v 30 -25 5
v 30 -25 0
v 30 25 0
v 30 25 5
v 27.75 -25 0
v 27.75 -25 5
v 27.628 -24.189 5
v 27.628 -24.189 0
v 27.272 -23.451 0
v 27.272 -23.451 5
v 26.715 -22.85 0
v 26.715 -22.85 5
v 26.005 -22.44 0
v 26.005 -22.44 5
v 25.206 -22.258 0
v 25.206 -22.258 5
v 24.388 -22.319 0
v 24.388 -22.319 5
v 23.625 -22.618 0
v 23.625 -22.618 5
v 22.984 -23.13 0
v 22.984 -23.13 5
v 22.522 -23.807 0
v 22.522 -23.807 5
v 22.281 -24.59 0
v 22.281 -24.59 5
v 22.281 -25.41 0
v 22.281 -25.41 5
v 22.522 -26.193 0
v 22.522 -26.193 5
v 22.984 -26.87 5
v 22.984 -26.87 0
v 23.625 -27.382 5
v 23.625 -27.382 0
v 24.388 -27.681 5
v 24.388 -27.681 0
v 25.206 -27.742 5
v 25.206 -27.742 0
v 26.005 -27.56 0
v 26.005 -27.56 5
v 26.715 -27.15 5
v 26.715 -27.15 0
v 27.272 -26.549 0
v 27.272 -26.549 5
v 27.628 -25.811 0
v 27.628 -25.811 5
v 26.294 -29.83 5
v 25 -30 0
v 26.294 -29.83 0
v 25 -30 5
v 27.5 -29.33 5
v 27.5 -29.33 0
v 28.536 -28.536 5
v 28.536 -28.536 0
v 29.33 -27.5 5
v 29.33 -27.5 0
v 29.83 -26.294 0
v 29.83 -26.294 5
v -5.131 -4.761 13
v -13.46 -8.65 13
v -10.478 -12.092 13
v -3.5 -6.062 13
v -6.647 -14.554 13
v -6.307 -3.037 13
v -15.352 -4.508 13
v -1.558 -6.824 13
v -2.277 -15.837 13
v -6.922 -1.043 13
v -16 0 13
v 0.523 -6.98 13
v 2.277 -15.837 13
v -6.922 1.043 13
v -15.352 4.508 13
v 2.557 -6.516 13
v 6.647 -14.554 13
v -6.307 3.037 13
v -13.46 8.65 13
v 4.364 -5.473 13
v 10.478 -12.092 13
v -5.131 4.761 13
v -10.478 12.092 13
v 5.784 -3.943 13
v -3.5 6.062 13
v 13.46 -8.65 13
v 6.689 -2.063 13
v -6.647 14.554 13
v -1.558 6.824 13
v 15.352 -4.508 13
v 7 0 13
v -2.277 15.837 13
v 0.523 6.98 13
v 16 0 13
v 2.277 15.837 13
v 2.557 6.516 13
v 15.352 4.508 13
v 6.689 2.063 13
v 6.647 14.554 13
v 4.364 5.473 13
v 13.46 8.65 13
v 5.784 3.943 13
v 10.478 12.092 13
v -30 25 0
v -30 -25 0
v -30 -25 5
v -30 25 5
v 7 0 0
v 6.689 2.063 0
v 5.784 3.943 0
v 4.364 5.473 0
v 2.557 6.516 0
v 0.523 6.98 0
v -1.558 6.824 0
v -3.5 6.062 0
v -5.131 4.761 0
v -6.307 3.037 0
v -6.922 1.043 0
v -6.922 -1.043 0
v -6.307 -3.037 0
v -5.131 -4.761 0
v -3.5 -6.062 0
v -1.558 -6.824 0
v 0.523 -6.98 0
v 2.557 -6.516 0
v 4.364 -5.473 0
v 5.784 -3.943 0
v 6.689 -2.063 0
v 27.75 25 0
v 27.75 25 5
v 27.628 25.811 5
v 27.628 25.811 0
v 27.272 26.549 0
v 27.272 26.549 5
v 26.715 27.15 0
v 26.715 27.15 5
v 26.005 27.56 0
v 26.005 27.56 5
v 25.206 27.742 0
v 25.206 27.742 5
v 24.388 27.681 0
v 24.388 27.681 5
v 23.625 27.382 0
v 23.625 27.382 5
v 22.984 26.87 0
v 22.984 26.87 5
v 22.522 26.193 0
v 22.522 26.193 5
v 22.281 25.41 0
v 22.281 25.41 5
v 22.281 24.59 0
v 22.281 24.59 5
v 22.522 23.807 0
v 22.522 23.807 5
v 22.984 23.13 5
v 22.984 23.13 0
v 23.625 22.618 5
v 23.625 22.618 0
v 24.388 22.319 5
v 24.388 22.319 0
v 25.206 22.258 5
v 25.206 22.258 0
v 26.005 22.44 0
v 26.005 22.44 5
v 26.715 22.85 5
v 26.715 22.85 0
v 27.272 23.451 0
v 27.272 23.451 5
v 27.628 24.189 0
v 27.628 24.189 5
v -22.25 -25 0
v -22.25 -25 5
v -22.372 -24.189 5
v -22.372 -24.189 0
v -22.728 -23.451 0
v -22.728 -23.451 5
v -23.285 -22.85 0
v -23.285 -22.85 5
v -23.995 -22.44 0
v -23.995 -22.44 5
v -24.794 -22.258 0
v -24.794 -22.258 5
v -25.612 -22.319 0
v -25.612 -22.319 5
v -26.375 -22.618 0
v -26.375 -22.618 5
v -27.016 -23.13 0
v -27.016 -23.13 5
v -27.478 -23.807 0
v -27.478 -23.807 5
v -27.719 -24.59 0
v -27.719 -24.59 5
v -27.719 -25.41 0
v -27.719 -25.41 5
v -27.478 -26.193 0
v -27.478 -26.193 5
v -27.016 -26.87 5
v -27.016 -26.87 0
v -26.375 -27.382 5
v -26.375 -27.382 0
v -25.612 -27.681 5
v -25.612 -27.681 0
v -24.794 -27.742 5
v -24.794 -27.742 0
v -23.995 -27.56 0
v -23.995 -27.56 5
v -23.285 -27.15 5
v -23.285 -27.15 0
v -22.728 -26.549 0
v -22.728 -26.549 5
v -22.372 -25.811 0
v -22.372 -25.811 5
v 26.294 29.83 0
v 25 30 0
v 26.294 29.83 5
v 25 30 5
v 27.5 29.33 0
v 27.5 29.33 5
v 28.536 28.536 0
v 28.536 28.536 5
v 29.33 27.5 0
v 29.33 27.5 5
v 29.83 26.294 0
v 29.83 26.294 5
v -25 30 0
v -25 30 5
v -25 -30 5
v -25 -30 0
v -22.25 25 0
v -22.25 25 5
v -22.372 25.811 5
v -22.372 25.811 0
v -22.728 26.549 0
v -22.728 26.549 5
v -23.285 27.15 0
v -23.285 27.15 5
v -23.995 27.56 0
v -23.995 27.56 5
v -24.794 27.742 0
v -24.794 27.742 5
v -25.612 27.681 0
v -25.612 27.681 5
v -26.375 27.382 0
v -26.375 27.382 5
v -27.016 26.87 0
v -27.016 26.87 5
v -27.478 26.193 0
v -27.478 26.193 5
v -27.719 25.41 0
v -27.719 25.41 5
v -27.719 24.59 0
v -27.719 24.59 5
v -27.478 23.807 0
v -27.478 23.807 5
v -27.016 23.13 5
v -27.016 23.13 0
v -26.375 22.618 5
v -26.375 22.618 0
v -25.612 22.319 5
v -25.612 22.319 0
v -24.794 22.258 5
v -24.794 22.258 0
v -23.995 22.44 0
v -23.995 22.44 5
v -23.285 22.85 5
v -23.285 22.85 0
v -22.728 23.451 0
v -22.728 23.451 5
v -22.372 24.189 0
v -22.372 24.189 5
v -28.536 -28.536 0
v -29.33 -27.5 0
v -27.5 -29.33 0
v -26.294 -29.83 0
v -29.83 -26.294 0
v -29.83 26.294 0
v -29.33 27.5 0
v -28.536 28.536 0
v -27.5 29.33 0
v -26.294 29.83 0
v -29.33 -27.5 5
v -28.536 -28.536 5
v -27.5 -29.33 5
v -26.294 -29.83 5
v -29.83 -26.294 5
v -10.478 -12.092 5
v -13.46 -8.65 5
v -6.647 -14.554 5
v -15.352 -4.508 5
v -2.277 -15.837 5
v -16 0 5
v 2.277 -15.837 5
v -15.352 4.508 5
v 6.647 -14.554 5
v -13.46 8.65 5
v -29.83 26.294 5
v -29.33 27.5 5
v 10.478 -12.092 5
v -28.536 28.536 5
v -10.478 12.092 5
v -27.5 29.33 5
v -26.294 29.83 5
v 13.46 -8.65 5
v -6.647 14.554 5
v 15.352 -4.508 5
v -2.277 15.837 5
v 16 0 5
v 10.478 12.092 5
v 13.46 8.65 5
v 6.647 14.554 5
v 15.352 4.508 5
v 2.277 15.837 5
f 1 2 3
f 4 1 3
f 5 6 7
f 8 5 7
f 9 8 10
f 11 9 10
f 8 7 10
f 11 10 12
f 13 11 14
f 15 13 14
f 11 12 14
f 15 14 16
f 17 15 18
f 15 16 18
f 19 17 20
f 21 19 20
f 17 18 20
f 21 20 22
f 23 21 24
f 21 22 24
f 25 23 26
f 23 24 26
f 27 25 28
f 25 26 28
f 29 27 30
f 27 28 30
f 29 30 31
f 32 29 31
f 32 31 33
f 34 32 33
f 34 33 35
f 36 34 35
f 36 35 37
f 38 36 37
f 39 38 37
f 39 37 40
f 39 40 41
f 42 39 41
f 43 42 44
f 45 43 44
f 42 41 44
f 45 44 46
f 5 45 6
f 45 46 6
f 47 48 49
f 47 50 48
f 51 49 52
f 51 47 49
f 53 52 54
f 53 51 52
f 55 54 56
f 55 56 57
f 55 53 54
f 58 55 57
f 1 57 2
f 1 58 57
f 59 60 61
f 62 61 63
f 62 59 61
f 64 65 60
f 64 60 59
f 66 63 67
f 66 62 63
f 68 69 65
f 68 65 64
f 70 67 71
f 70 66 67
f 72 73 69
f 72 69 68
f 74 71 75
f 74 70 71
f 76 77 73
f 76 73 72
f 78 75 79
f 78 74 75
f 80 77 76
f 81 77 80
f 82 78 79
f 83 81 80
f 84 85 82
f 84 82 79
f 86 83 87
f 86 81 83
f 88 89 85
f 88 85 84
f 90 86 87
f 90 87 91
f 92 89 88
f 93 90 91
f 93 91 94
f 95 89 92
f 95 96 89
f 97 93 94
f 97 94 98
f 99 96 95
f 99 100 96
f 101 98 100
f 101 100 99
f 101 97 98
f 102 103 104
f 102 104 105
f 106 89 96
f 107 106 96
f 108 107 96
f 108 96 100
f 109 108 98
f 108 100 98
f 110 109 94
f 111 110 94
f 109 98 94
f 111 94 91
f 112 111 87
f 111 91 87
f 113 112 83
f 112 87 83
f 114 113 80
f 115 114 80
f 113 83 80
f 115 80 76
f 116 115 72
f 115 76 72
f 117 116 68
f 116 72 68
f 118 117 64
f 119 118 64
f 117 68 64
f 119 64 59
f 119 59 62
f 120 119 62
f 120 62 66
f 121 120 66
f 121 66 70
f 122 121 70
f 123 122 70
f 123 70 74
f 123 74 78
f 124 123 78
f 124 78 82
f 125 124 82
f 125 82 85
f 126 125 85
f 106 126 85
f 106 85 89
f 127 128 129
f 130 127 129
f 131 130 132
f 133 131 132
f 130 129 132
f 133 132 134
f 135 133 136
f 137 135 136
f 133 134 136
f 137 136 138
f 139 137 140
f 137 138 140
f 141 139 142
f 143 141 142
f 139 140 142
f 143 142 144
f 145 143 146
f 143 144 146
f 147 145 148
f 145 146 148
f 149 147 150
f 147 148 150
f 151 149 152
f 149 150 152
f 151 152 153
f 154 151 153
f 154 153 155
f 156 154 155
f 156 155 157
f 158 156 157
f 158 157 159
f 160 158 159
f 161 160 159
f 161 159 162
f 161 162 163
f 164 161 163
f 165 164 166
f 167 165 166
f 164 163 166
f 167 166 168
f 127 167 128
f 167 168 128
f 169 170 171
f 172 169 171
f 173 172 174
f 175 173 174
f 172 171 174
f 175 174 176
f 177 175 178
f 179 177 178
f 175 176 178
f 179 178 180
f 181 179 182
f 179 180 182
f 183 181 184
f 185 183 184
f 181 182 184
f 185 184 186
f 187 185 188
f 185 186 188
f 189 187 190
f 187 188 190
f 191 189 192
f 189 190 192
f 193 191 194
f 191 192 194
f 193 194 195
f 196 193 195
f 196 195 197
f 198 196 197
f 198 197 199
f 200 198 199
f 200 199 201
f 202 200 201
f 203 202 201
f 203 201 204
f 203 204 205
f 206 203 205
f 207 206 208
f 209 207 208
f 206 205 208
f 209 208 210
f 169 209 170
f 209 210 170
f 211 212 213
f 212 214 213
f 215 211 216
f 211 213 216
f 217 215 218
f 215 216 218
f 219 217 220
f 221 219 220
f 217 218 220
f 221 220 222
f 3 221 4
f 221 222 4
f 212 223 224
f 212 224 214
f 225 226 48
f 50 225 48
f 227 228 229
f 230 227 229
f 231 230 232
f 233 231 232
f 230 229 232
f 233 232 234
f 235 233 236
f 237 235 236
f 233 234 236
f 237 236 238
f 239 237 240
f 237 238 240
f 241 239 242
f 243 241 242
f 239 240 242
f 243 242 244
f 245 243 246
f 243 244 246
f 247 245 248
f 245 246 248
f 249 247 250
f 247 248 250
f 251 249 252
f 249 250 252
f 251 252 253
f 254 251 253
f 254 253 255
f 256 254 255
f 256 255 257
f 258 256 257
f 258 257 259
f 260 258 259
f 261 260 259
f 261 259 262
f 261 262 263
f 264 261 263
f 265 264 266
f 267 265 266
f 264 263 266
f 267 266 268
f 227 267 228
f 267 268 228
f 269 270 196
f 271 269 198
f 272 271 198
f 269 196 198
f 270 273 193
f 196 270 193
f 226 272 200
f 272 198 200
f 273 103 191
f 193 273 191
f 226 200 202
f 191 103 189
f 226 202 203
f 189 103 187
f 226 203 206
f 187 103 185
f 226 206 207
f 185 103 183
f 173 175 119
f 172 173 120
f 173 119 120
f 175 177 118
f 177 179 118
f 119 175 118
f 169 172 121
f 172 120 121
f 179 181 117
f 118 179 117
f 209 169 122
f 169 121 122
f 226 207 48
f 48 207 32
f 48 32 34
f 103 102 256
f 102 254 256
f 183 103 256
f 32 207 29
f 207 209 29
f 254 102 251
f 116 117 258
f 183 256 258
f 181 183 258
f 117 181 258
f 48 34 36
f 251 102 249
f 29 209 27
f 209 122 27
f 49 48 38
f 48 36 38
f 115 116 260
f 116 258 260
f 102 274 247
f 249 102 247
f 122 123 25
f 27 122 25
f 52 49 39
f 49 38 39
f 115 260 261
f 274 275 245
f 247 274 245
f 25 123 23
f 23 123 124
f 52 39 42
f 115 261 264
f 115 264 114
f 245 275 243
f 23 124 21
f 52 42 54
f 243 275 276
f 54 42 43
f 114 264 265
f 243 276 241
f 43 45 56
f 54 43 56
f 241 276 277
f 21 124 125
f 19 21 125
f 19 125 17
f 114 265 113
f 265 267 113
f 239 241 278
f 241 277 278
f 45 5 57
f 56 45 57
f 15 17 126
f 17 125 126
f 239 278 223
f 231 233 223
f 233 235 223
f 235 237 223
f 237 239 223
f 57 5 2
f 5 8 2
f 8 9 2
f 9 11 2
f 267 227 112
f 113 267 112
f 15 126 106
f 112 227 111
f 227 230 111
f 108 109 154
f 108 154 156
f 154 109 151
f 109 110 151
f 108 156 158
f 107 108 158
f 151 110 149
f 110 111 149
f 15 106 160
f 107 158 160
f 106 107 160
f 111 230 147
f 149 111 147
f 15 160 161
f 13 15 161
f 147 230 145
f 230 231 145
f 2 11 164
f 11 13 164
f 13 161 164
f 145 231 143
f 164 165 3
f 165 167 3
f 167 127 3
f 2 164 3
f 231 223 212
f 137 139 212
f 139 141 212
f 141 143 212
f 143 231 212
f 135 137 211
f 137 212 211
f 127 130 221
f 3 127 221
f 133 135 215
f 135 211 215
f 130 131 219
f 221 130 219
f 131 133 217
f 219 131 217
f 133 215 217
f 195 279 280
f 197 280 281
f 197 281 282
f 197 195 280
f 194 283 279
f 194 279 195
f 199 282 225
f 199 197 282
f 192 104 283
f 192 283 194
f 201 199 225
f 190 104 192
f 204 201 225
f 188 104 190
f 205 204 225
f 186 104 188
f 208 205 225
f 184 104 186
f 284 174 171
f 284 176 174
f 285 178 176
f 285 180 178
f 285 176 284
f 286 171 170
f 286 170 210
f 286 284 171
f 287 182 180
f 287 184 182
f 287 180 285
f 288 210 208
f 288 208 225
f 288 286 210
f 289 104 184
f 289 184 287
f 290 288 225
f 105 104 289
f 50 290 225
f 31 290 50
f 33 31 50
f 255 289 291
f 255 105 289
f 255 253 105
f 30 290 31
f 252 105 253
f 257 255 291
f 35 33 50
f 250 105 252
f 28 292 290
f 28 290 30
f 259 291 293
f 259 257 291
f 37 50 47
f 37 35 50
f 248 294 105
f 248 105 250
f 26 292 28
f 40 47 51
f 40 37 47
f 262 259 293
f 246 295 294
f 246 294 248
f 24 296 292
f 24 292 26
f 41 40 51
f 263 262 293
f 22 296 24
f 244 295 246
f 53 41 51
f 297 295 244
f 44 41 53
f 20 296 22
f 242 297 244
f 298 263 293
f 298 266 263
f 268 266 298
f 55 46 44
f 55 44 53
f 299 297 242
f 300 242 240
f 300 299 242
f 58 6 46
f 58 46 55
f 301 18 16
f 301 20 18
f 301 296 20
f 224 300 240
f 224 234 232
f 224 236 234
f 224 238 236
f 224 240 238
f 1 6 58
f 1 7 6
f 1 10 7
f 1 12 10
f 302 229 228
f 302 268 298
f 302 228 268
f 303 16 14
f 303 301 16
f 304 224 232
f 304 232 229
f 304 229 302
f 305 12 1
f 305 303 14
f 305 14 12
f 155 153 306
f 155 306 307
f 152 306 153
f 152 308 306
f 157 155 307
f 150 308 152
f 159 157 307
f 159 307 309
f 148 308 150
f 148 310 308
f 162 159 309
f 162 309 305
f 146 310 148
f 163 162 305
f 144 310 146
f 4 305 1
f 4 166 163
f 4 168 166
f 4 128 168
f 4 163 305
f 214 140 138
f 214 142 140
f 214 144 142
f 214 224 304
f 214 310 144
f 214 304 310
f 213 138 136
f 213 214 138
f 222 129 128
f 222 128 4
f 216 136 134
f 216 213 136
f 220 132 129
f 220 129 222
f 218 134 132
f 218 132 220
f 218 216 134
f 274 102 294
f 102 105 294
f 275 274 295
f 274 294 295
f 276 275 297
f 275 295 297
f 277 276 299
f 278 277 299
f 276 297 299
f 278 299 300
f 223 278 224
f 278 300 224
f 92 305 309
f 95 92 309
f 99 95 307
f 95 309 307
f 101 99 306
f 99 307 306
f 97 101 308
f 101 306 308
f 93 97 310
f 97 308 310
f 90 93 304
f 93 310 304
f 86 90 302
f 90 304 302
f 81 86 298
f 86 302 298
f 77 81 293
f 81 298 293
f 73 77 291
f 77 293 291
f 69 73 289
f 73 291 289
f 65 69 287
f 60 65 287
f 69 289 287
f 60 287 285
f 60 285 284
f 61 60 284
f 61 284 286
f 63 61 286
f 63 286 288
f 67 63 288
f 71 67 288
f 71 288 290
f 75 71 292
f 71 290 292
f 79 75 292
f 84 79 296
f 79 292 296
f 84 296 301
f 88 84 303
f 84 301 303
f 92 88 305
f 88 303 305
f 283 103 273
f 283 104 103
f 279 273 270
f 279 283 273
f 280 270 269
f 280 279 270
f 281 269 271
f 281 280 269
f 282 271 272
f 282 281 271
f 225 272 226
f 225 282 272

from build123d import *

# Parameters (mm, degrees)
SKETCH1_W           = 60
SKETCH1_H           = 60
BOSS_EXTRUDE1_DEPTH = 5
SKETCH2_R           = 2.75
CUT_EXTRUDE1_DEPTH  = 5
FILLET1_R           = 5
SKETCH3_R           = 16
BOSS_EXTRUDE2_DEPTH = 8
SKETCH4_R           = 7
CUT_EXTRUDE2_DEPTH  = 14


with BuildPart() as part:
    # Sketch1 → Boss-Extrude1 (new body)
    with BuildSketch(Plane.XY):
        Rectangle(SKETCH1_W, SKETCH1_H)
    extrude(amount=BOSS_EXTRUDE1_DEPTH)

    # Sketch2 → Cut-Extrude1 (cut)
    with BuildSketch(Plane.XY.offset(5)):
        with Locations((-25, 25)):
            Circle(SKETCH2_R)
        with Locations((25, 25)):
            Circle(SKETCH2_R)
        with Locations((25, -25)):
            Circle(SKETCH2_R)
        with Locations((-25, -25)):
            Circle(SKETCH2_R)
    extrude(amount=-CUT_EXTRUDE1_DEPTH, mode=Mode.SUBTRACT)

    # Fillet1
    fillet1_edges = [part.edges().sort_by_distance(p)[0] for p in [
        (-30, 30, 2.5),
        (30, 30, 2.5),
        (30, -30, 2.5),
        (-30, -30, 2.5),
    ]]
    fillet(fillet1_edges, radius=FILLET1_R)

    # Sketch3 → Boss-Extrude2 (add)
    with BuildSketch(Plane.XY.offset(5)):
        Circle(SKETCH3_R)
    extrude(amount=BOSS_EXTRUDE2_DEPTH)

    # Sketch4 → Cut-Extrude2 (cut, through all)
    with BuildSketch(Plane.XY.offset(13)):
        Circle(SKETCH4_R)
    extrude(amount=-CUT_EXTRUDE2_DEPTH, mode=Mode.SUBTRACT)


solid = part.part
